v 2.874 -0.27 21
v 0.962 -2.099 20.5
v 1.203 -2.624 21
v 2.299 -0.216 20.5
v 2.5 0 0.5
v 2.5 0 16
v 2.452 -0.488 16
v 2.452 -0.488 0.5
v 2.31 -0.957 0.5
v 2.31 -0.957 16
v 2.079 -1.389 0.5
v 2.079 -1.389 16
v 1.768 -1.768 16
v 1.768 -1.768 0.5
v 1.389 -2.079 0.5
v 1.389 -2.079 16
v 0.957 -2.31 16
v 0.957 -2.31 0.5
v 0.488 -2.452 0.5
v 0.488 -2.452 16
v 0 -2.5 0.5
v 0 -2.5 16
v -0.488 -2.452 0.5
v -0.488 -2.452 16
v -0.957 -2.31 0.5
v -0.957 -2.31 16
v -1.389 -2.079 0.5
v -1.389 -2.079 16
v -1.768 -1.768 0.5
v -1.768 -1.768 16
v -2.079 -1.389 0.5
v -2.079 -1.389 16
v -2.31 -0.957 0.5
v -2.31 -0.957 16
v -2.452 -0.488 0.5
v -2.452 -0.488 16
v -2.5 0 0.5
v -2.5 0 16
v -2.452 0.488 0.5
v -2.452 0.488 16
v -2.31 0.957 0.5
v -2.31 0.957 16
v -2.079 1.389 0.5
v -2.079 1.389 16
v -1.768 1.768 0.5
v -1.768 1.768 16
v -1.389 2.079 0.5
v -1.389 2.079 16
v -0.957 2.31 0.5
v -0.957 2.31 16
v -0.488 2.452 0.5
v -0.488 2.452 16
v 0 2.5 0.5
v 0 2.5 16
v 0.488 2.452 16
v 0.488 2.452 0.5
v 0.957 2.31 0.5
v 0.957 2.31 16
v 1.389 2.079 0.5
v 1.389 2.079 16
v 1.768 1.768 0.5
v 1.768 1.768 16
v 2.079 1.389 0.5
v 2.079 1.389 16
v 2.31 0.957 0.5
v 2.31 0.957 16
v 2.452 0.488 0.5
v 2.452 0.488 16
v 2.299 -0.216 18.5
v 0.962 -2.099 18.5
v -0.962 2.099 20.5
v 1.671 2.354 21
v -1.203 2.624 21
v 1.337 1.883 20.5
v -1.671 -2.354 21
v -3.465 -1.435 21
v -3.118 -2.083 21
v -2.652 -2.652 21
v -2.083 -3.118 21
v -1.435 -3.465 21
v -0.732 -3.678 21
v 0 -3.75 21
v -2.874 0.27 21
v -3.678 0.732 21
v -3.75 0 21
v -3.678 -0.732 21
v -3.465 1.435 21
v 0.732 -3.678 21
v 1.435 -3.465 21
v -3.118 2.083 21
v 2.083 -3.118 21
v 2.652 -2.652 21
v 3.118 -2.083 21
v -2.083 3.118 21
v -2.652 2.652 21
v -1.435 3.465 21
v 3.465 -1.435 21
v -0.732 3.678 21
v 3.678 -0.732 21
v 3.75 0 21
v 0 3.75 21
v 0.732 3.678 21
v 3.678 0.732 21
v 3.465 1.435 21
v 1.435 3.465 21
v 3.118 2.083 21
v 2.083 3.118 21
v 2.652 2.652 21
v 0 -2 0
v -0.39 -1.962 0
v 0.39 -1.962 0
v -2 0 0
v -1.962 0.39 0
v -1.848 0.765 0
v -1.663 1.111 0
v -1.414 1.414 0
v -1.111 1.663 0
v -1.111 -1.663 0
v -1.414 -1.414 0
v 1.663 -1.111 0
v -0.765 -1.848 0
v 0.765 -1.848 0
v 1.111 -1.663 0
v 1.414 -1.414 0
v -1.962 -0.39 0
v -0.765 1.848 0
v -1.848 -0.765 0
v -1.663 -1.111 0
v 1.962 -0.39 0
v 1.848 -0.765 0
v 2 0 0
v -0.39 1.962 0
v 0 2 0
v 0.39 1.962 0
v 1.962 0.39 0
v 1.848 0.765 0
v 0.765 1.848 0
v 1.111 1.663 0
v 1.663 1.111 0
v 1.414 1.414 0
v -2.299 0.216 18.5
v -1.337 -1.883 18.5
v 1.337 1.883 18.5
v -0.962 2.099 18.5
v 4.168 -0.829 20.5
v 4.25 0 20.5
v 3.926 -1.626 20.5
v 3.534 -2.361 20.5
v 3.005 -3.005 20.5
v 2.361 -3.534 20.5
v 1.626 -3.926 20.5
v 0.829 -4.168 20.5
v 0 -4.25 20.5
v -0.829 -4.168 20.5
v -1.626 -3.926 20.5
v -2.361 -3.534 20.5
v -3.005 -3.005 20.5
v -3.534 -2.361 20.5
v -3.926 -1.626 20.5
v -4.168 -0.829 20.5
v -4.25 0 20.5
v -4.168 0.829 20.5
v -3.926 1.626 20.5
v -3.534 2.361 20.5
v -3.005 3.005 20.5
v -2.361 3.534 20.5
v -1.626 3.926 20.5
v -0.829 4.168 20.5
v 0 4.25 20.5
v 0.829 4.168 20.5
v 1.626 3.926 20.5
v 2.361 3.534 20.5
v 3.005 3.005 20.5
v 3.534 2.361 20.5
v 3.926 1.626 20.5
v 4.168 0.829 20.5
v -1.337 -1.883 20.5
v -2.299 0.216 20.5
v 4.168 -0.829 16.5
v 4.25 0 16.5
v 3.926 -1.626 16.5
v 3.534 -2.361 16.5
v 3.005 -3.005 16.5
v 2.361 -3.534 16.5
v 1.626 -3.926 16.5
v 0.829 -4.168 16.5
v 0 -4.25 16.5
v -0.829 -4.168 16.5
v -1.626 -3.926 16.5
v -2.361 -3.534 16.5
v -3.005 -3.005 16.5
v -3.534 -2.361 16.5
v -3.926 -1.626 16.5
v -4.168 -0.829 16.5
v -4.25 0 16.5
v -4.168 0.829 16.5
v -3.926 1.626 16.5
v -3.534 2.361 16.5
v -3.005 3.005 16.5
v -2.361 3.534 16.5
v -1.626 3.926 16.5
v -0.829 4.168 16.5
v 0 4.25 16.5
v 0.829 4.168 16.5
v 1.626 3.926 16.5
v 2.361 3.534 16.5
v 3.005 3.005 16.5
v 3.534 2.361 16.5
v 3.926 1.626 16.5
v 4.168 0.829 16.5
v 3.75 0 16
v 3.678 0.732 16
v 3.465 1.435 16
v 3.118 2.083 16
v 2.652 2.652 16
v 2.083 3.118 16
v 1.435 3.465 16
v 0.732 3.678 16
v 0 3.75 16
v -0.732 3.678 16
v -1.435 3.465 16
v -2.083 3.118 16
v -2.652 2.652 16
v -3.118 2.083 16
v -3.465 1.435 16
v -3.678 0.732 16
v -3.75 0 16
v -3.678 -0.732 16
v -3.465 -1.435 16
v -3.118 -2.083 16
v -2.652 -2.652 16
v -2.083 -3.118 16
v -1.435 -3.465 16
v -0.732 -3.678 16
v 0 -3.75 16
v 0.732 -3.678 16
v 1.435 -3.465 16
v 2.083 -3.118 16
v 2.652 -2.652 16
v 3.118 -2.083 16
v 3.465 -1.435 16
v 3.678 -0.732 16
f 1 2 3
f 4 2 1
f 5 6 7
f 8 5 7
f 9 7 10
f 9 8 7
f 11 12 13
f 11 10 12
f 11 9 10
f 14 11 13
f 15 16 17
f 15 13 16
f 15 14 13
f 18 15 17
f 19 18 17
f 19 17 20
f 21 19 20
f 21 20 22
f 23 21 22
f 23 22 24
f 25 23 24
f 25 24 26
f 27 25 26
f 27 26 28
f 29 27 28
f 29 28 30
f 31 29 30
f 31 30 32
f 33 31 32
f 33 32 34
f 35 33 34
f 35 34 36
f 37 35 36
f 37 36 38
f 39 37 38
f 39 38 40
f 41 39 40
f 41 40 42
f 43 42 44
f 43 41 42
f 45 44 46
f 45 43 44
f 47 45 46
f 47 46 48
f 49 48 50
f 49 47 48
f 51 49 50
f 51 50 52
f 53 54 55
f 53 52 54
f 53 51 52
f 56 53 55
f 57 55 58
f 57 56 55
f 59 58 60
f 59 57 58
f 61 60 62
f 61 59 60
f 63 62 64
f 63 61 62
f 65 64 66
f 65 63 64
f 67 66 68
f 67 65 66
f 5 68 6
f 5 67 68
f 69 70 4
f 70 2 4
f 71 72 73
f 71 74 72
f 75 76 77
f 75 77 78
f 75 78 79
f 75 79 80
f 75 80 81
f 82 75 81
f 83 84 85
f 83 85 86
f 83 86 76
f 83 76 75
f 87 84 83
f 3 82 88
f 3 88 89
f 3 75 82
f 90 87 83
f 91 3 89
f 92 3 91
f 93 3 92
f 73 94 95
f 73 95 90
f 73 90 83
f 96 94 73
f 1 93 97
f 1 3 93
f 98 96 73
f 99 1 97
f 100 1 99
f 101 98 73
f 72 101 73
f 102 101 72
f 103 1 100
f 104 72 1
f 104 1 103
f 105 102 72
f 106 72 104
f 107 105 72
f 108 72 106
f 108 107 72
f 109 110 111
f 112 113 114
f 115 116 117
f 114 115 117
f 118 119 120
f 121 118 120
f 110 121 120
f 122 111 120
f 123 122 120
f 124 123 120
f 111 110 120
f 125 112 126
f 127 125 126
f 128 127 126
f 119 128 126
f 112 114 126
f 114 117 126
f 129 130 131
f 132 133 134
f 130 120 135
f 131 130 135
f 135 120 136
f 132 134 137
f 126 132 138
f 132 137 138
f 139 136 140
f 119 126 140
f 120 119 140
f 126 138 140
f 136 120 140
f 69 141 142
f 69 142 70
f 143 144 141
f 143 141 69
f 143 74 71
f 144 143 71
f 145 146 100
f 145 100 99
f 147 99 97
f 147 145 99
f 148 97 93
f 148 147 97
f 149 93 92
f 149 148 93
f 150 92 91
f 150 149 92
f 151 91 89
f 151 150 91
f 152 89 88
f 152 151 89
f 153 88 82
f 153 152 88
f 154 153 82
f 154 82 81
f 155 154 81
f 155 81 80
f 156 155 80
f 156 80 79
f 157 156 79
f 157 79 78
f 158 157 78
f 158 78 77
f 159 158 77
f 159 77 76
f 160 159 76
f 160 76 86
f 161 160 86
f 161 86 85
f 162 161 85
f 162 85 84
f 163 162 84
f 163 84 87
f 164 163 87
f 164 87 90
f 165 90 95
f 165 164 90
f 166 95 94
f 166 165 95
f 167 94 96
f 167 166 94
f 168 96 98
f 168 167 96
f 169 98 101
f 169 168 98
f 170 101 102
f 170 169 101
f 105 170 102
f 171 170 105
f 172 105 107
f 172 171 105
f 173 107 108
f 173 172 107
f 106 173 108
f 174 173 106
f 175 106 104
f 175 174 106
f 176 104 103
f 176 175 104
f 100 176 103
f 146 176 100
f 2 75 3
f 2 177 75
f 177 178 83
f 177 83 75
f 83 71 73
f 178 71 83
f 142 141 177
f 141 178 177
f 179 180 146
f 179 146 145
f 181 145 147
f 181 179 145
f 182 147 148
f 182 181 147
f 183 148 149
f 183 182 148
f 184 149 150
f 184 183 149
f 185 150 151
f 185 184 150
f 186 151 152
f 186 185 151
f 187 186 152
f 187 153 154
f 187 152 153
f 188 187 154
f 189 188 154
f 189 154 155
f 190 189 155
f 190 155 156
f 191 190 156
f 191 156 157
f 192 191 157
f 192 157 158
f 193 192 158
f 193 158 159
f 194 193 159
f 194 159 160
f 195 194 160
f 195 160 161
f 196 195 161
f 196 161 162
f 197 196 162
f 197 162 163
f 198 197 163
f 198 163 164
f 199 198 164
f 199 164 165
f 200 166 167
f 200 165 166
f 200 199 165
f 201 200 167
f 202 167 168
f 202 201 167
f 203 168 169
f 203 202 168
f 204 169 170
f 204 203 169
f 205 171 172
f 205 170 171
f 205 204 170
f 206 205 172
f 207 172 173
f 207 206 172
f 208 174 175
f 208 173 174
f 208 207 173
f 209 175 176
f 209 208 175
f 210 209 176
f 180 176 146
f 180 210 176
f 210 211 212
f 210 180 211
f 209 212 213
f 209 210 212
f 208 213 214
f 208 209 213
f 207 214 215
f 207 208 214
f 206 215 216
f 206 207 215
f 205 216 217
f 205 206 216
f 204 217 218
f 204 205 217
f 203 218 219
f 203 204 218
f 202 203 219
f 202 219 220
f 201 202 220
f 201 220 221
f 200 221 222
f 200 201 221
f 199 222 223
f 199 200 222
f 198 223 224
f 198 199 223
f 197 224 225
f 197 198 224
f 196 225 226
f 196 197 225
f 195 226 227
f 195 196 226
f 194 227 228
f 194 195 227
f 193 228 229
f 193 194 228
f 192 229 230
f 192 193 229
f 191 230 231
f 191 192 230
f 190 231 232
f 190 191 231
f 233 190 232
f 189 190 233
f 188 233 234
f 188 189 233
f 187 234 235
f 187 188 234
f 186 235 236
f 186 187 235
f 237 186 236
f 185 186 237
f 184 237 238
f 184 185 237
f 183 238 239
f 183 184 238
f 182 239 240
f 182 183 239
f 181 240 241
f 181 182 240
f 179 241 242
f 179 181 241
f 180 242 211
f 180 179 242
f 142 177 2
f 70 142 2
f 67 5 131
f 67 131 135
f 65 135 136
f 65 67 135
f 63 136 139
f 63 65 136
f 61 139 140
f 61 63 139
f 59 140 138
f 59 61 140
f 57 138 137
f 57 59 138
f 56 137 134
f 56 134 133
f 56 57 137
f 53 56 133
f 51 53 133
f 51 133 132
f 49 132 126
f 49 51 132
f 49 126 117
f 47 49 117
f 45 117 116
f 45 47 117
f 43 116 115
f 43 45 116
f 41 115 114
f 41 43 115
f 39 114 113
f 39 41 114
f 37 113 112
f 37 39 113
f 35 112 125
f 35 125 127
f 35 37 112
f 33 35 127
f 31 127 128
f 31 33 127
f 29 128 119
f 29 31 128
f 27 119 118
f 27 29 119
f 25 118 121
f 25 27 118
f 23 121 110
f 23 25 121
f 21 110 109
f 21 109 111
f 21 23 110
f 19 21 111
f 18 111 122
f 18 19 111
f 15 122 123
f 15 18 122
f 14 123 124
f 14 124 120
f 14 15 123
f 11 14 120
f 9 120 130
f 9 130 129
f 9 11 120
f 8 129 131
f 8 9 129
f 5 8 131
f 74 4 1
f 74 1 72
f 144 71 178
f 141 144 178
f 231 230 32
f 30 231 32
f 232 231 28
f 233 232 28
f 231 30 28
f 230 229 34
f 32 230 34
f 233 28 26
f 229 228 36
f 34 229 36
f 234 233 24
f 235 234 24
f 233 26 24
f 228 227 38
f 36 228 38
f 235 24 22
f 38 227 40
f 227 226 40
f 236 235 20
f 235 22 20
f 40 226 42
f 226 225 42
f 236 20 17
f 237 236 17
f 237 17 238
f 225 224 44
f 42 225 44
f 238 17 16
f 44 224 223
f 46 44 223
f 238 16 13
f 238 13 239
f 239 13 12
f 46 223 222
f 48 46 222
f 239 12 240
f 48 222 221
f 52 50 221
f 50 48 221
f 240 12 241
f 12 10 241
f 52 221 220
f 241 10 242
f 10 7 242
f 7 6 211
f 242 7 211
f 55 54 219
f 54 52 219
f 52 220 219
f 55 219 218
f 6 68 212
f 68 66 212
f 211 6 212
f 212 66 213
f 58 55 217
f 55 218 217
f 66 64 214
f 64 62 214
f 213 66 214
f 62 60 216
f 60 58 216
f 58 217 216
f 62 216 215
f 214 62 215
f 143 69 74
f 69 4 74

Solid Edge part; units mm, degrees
sketch "Sketch1" plane through (0, 0, 0) normal (0, -1, 0) x (1, 0, 0)
  line L0 (2.5, 16) -> (2.5, 0)
  line L1 (2.5, 0) -> (0, 0)
  line L2 (0, 0) -> (0, 21)
  line L3 (0, 21) -> (4.25, 21)
  line L4 (4.25, 21) -> (4.25, 16)
  line L5 (4.25, 16) -> (2.5, 16)
revolve "RevolvedProtrusion1" add sketch "Sketch1" angle 360 about axis through (0, 0, 0) along (0, 0, 1)
sketch "Sketch2" plane through (0, 0, 21) normal (0, 0, 1) x (1, 0, 0)
  line L0 (0.9623, -2.0994) -> (2.2992, -0.2164)
  line L1 (2.2992, -0.2164) -> (1.337, 1.883)
  line L2 (1.337, 1.883) -> (-0.9623, 2.0994)
  line L3 (-0.9623, 2.0994) -> (-2.2992, 0.2164)
  line L4 (-2.2992, 0.2164) -> (-1.337, -1.883)
  line L5 (-1.337, -1.883) -> (0.9623, -2.0994)
extrude "Cutout1" cut sketch "Sketch2" against normal blind 2.5
cosmetic_thread "Thread1" size "M5"
chamfer "Chamfer1" distance 0.5 angle 45 9 edges at (-4.25, 0, 16) (-4.25, 0, 21) (-2.5, 0, 0) (1.8181, 0.8333, 21) (0.1874, 1.9912, 21) (-1.6307, 1.1579, 21) (-1.8181, -0.8333, 21) (-0.1874, -1.9912, 21) (1.6307, -1.1579, 21)
properties material "Stainless steel"
